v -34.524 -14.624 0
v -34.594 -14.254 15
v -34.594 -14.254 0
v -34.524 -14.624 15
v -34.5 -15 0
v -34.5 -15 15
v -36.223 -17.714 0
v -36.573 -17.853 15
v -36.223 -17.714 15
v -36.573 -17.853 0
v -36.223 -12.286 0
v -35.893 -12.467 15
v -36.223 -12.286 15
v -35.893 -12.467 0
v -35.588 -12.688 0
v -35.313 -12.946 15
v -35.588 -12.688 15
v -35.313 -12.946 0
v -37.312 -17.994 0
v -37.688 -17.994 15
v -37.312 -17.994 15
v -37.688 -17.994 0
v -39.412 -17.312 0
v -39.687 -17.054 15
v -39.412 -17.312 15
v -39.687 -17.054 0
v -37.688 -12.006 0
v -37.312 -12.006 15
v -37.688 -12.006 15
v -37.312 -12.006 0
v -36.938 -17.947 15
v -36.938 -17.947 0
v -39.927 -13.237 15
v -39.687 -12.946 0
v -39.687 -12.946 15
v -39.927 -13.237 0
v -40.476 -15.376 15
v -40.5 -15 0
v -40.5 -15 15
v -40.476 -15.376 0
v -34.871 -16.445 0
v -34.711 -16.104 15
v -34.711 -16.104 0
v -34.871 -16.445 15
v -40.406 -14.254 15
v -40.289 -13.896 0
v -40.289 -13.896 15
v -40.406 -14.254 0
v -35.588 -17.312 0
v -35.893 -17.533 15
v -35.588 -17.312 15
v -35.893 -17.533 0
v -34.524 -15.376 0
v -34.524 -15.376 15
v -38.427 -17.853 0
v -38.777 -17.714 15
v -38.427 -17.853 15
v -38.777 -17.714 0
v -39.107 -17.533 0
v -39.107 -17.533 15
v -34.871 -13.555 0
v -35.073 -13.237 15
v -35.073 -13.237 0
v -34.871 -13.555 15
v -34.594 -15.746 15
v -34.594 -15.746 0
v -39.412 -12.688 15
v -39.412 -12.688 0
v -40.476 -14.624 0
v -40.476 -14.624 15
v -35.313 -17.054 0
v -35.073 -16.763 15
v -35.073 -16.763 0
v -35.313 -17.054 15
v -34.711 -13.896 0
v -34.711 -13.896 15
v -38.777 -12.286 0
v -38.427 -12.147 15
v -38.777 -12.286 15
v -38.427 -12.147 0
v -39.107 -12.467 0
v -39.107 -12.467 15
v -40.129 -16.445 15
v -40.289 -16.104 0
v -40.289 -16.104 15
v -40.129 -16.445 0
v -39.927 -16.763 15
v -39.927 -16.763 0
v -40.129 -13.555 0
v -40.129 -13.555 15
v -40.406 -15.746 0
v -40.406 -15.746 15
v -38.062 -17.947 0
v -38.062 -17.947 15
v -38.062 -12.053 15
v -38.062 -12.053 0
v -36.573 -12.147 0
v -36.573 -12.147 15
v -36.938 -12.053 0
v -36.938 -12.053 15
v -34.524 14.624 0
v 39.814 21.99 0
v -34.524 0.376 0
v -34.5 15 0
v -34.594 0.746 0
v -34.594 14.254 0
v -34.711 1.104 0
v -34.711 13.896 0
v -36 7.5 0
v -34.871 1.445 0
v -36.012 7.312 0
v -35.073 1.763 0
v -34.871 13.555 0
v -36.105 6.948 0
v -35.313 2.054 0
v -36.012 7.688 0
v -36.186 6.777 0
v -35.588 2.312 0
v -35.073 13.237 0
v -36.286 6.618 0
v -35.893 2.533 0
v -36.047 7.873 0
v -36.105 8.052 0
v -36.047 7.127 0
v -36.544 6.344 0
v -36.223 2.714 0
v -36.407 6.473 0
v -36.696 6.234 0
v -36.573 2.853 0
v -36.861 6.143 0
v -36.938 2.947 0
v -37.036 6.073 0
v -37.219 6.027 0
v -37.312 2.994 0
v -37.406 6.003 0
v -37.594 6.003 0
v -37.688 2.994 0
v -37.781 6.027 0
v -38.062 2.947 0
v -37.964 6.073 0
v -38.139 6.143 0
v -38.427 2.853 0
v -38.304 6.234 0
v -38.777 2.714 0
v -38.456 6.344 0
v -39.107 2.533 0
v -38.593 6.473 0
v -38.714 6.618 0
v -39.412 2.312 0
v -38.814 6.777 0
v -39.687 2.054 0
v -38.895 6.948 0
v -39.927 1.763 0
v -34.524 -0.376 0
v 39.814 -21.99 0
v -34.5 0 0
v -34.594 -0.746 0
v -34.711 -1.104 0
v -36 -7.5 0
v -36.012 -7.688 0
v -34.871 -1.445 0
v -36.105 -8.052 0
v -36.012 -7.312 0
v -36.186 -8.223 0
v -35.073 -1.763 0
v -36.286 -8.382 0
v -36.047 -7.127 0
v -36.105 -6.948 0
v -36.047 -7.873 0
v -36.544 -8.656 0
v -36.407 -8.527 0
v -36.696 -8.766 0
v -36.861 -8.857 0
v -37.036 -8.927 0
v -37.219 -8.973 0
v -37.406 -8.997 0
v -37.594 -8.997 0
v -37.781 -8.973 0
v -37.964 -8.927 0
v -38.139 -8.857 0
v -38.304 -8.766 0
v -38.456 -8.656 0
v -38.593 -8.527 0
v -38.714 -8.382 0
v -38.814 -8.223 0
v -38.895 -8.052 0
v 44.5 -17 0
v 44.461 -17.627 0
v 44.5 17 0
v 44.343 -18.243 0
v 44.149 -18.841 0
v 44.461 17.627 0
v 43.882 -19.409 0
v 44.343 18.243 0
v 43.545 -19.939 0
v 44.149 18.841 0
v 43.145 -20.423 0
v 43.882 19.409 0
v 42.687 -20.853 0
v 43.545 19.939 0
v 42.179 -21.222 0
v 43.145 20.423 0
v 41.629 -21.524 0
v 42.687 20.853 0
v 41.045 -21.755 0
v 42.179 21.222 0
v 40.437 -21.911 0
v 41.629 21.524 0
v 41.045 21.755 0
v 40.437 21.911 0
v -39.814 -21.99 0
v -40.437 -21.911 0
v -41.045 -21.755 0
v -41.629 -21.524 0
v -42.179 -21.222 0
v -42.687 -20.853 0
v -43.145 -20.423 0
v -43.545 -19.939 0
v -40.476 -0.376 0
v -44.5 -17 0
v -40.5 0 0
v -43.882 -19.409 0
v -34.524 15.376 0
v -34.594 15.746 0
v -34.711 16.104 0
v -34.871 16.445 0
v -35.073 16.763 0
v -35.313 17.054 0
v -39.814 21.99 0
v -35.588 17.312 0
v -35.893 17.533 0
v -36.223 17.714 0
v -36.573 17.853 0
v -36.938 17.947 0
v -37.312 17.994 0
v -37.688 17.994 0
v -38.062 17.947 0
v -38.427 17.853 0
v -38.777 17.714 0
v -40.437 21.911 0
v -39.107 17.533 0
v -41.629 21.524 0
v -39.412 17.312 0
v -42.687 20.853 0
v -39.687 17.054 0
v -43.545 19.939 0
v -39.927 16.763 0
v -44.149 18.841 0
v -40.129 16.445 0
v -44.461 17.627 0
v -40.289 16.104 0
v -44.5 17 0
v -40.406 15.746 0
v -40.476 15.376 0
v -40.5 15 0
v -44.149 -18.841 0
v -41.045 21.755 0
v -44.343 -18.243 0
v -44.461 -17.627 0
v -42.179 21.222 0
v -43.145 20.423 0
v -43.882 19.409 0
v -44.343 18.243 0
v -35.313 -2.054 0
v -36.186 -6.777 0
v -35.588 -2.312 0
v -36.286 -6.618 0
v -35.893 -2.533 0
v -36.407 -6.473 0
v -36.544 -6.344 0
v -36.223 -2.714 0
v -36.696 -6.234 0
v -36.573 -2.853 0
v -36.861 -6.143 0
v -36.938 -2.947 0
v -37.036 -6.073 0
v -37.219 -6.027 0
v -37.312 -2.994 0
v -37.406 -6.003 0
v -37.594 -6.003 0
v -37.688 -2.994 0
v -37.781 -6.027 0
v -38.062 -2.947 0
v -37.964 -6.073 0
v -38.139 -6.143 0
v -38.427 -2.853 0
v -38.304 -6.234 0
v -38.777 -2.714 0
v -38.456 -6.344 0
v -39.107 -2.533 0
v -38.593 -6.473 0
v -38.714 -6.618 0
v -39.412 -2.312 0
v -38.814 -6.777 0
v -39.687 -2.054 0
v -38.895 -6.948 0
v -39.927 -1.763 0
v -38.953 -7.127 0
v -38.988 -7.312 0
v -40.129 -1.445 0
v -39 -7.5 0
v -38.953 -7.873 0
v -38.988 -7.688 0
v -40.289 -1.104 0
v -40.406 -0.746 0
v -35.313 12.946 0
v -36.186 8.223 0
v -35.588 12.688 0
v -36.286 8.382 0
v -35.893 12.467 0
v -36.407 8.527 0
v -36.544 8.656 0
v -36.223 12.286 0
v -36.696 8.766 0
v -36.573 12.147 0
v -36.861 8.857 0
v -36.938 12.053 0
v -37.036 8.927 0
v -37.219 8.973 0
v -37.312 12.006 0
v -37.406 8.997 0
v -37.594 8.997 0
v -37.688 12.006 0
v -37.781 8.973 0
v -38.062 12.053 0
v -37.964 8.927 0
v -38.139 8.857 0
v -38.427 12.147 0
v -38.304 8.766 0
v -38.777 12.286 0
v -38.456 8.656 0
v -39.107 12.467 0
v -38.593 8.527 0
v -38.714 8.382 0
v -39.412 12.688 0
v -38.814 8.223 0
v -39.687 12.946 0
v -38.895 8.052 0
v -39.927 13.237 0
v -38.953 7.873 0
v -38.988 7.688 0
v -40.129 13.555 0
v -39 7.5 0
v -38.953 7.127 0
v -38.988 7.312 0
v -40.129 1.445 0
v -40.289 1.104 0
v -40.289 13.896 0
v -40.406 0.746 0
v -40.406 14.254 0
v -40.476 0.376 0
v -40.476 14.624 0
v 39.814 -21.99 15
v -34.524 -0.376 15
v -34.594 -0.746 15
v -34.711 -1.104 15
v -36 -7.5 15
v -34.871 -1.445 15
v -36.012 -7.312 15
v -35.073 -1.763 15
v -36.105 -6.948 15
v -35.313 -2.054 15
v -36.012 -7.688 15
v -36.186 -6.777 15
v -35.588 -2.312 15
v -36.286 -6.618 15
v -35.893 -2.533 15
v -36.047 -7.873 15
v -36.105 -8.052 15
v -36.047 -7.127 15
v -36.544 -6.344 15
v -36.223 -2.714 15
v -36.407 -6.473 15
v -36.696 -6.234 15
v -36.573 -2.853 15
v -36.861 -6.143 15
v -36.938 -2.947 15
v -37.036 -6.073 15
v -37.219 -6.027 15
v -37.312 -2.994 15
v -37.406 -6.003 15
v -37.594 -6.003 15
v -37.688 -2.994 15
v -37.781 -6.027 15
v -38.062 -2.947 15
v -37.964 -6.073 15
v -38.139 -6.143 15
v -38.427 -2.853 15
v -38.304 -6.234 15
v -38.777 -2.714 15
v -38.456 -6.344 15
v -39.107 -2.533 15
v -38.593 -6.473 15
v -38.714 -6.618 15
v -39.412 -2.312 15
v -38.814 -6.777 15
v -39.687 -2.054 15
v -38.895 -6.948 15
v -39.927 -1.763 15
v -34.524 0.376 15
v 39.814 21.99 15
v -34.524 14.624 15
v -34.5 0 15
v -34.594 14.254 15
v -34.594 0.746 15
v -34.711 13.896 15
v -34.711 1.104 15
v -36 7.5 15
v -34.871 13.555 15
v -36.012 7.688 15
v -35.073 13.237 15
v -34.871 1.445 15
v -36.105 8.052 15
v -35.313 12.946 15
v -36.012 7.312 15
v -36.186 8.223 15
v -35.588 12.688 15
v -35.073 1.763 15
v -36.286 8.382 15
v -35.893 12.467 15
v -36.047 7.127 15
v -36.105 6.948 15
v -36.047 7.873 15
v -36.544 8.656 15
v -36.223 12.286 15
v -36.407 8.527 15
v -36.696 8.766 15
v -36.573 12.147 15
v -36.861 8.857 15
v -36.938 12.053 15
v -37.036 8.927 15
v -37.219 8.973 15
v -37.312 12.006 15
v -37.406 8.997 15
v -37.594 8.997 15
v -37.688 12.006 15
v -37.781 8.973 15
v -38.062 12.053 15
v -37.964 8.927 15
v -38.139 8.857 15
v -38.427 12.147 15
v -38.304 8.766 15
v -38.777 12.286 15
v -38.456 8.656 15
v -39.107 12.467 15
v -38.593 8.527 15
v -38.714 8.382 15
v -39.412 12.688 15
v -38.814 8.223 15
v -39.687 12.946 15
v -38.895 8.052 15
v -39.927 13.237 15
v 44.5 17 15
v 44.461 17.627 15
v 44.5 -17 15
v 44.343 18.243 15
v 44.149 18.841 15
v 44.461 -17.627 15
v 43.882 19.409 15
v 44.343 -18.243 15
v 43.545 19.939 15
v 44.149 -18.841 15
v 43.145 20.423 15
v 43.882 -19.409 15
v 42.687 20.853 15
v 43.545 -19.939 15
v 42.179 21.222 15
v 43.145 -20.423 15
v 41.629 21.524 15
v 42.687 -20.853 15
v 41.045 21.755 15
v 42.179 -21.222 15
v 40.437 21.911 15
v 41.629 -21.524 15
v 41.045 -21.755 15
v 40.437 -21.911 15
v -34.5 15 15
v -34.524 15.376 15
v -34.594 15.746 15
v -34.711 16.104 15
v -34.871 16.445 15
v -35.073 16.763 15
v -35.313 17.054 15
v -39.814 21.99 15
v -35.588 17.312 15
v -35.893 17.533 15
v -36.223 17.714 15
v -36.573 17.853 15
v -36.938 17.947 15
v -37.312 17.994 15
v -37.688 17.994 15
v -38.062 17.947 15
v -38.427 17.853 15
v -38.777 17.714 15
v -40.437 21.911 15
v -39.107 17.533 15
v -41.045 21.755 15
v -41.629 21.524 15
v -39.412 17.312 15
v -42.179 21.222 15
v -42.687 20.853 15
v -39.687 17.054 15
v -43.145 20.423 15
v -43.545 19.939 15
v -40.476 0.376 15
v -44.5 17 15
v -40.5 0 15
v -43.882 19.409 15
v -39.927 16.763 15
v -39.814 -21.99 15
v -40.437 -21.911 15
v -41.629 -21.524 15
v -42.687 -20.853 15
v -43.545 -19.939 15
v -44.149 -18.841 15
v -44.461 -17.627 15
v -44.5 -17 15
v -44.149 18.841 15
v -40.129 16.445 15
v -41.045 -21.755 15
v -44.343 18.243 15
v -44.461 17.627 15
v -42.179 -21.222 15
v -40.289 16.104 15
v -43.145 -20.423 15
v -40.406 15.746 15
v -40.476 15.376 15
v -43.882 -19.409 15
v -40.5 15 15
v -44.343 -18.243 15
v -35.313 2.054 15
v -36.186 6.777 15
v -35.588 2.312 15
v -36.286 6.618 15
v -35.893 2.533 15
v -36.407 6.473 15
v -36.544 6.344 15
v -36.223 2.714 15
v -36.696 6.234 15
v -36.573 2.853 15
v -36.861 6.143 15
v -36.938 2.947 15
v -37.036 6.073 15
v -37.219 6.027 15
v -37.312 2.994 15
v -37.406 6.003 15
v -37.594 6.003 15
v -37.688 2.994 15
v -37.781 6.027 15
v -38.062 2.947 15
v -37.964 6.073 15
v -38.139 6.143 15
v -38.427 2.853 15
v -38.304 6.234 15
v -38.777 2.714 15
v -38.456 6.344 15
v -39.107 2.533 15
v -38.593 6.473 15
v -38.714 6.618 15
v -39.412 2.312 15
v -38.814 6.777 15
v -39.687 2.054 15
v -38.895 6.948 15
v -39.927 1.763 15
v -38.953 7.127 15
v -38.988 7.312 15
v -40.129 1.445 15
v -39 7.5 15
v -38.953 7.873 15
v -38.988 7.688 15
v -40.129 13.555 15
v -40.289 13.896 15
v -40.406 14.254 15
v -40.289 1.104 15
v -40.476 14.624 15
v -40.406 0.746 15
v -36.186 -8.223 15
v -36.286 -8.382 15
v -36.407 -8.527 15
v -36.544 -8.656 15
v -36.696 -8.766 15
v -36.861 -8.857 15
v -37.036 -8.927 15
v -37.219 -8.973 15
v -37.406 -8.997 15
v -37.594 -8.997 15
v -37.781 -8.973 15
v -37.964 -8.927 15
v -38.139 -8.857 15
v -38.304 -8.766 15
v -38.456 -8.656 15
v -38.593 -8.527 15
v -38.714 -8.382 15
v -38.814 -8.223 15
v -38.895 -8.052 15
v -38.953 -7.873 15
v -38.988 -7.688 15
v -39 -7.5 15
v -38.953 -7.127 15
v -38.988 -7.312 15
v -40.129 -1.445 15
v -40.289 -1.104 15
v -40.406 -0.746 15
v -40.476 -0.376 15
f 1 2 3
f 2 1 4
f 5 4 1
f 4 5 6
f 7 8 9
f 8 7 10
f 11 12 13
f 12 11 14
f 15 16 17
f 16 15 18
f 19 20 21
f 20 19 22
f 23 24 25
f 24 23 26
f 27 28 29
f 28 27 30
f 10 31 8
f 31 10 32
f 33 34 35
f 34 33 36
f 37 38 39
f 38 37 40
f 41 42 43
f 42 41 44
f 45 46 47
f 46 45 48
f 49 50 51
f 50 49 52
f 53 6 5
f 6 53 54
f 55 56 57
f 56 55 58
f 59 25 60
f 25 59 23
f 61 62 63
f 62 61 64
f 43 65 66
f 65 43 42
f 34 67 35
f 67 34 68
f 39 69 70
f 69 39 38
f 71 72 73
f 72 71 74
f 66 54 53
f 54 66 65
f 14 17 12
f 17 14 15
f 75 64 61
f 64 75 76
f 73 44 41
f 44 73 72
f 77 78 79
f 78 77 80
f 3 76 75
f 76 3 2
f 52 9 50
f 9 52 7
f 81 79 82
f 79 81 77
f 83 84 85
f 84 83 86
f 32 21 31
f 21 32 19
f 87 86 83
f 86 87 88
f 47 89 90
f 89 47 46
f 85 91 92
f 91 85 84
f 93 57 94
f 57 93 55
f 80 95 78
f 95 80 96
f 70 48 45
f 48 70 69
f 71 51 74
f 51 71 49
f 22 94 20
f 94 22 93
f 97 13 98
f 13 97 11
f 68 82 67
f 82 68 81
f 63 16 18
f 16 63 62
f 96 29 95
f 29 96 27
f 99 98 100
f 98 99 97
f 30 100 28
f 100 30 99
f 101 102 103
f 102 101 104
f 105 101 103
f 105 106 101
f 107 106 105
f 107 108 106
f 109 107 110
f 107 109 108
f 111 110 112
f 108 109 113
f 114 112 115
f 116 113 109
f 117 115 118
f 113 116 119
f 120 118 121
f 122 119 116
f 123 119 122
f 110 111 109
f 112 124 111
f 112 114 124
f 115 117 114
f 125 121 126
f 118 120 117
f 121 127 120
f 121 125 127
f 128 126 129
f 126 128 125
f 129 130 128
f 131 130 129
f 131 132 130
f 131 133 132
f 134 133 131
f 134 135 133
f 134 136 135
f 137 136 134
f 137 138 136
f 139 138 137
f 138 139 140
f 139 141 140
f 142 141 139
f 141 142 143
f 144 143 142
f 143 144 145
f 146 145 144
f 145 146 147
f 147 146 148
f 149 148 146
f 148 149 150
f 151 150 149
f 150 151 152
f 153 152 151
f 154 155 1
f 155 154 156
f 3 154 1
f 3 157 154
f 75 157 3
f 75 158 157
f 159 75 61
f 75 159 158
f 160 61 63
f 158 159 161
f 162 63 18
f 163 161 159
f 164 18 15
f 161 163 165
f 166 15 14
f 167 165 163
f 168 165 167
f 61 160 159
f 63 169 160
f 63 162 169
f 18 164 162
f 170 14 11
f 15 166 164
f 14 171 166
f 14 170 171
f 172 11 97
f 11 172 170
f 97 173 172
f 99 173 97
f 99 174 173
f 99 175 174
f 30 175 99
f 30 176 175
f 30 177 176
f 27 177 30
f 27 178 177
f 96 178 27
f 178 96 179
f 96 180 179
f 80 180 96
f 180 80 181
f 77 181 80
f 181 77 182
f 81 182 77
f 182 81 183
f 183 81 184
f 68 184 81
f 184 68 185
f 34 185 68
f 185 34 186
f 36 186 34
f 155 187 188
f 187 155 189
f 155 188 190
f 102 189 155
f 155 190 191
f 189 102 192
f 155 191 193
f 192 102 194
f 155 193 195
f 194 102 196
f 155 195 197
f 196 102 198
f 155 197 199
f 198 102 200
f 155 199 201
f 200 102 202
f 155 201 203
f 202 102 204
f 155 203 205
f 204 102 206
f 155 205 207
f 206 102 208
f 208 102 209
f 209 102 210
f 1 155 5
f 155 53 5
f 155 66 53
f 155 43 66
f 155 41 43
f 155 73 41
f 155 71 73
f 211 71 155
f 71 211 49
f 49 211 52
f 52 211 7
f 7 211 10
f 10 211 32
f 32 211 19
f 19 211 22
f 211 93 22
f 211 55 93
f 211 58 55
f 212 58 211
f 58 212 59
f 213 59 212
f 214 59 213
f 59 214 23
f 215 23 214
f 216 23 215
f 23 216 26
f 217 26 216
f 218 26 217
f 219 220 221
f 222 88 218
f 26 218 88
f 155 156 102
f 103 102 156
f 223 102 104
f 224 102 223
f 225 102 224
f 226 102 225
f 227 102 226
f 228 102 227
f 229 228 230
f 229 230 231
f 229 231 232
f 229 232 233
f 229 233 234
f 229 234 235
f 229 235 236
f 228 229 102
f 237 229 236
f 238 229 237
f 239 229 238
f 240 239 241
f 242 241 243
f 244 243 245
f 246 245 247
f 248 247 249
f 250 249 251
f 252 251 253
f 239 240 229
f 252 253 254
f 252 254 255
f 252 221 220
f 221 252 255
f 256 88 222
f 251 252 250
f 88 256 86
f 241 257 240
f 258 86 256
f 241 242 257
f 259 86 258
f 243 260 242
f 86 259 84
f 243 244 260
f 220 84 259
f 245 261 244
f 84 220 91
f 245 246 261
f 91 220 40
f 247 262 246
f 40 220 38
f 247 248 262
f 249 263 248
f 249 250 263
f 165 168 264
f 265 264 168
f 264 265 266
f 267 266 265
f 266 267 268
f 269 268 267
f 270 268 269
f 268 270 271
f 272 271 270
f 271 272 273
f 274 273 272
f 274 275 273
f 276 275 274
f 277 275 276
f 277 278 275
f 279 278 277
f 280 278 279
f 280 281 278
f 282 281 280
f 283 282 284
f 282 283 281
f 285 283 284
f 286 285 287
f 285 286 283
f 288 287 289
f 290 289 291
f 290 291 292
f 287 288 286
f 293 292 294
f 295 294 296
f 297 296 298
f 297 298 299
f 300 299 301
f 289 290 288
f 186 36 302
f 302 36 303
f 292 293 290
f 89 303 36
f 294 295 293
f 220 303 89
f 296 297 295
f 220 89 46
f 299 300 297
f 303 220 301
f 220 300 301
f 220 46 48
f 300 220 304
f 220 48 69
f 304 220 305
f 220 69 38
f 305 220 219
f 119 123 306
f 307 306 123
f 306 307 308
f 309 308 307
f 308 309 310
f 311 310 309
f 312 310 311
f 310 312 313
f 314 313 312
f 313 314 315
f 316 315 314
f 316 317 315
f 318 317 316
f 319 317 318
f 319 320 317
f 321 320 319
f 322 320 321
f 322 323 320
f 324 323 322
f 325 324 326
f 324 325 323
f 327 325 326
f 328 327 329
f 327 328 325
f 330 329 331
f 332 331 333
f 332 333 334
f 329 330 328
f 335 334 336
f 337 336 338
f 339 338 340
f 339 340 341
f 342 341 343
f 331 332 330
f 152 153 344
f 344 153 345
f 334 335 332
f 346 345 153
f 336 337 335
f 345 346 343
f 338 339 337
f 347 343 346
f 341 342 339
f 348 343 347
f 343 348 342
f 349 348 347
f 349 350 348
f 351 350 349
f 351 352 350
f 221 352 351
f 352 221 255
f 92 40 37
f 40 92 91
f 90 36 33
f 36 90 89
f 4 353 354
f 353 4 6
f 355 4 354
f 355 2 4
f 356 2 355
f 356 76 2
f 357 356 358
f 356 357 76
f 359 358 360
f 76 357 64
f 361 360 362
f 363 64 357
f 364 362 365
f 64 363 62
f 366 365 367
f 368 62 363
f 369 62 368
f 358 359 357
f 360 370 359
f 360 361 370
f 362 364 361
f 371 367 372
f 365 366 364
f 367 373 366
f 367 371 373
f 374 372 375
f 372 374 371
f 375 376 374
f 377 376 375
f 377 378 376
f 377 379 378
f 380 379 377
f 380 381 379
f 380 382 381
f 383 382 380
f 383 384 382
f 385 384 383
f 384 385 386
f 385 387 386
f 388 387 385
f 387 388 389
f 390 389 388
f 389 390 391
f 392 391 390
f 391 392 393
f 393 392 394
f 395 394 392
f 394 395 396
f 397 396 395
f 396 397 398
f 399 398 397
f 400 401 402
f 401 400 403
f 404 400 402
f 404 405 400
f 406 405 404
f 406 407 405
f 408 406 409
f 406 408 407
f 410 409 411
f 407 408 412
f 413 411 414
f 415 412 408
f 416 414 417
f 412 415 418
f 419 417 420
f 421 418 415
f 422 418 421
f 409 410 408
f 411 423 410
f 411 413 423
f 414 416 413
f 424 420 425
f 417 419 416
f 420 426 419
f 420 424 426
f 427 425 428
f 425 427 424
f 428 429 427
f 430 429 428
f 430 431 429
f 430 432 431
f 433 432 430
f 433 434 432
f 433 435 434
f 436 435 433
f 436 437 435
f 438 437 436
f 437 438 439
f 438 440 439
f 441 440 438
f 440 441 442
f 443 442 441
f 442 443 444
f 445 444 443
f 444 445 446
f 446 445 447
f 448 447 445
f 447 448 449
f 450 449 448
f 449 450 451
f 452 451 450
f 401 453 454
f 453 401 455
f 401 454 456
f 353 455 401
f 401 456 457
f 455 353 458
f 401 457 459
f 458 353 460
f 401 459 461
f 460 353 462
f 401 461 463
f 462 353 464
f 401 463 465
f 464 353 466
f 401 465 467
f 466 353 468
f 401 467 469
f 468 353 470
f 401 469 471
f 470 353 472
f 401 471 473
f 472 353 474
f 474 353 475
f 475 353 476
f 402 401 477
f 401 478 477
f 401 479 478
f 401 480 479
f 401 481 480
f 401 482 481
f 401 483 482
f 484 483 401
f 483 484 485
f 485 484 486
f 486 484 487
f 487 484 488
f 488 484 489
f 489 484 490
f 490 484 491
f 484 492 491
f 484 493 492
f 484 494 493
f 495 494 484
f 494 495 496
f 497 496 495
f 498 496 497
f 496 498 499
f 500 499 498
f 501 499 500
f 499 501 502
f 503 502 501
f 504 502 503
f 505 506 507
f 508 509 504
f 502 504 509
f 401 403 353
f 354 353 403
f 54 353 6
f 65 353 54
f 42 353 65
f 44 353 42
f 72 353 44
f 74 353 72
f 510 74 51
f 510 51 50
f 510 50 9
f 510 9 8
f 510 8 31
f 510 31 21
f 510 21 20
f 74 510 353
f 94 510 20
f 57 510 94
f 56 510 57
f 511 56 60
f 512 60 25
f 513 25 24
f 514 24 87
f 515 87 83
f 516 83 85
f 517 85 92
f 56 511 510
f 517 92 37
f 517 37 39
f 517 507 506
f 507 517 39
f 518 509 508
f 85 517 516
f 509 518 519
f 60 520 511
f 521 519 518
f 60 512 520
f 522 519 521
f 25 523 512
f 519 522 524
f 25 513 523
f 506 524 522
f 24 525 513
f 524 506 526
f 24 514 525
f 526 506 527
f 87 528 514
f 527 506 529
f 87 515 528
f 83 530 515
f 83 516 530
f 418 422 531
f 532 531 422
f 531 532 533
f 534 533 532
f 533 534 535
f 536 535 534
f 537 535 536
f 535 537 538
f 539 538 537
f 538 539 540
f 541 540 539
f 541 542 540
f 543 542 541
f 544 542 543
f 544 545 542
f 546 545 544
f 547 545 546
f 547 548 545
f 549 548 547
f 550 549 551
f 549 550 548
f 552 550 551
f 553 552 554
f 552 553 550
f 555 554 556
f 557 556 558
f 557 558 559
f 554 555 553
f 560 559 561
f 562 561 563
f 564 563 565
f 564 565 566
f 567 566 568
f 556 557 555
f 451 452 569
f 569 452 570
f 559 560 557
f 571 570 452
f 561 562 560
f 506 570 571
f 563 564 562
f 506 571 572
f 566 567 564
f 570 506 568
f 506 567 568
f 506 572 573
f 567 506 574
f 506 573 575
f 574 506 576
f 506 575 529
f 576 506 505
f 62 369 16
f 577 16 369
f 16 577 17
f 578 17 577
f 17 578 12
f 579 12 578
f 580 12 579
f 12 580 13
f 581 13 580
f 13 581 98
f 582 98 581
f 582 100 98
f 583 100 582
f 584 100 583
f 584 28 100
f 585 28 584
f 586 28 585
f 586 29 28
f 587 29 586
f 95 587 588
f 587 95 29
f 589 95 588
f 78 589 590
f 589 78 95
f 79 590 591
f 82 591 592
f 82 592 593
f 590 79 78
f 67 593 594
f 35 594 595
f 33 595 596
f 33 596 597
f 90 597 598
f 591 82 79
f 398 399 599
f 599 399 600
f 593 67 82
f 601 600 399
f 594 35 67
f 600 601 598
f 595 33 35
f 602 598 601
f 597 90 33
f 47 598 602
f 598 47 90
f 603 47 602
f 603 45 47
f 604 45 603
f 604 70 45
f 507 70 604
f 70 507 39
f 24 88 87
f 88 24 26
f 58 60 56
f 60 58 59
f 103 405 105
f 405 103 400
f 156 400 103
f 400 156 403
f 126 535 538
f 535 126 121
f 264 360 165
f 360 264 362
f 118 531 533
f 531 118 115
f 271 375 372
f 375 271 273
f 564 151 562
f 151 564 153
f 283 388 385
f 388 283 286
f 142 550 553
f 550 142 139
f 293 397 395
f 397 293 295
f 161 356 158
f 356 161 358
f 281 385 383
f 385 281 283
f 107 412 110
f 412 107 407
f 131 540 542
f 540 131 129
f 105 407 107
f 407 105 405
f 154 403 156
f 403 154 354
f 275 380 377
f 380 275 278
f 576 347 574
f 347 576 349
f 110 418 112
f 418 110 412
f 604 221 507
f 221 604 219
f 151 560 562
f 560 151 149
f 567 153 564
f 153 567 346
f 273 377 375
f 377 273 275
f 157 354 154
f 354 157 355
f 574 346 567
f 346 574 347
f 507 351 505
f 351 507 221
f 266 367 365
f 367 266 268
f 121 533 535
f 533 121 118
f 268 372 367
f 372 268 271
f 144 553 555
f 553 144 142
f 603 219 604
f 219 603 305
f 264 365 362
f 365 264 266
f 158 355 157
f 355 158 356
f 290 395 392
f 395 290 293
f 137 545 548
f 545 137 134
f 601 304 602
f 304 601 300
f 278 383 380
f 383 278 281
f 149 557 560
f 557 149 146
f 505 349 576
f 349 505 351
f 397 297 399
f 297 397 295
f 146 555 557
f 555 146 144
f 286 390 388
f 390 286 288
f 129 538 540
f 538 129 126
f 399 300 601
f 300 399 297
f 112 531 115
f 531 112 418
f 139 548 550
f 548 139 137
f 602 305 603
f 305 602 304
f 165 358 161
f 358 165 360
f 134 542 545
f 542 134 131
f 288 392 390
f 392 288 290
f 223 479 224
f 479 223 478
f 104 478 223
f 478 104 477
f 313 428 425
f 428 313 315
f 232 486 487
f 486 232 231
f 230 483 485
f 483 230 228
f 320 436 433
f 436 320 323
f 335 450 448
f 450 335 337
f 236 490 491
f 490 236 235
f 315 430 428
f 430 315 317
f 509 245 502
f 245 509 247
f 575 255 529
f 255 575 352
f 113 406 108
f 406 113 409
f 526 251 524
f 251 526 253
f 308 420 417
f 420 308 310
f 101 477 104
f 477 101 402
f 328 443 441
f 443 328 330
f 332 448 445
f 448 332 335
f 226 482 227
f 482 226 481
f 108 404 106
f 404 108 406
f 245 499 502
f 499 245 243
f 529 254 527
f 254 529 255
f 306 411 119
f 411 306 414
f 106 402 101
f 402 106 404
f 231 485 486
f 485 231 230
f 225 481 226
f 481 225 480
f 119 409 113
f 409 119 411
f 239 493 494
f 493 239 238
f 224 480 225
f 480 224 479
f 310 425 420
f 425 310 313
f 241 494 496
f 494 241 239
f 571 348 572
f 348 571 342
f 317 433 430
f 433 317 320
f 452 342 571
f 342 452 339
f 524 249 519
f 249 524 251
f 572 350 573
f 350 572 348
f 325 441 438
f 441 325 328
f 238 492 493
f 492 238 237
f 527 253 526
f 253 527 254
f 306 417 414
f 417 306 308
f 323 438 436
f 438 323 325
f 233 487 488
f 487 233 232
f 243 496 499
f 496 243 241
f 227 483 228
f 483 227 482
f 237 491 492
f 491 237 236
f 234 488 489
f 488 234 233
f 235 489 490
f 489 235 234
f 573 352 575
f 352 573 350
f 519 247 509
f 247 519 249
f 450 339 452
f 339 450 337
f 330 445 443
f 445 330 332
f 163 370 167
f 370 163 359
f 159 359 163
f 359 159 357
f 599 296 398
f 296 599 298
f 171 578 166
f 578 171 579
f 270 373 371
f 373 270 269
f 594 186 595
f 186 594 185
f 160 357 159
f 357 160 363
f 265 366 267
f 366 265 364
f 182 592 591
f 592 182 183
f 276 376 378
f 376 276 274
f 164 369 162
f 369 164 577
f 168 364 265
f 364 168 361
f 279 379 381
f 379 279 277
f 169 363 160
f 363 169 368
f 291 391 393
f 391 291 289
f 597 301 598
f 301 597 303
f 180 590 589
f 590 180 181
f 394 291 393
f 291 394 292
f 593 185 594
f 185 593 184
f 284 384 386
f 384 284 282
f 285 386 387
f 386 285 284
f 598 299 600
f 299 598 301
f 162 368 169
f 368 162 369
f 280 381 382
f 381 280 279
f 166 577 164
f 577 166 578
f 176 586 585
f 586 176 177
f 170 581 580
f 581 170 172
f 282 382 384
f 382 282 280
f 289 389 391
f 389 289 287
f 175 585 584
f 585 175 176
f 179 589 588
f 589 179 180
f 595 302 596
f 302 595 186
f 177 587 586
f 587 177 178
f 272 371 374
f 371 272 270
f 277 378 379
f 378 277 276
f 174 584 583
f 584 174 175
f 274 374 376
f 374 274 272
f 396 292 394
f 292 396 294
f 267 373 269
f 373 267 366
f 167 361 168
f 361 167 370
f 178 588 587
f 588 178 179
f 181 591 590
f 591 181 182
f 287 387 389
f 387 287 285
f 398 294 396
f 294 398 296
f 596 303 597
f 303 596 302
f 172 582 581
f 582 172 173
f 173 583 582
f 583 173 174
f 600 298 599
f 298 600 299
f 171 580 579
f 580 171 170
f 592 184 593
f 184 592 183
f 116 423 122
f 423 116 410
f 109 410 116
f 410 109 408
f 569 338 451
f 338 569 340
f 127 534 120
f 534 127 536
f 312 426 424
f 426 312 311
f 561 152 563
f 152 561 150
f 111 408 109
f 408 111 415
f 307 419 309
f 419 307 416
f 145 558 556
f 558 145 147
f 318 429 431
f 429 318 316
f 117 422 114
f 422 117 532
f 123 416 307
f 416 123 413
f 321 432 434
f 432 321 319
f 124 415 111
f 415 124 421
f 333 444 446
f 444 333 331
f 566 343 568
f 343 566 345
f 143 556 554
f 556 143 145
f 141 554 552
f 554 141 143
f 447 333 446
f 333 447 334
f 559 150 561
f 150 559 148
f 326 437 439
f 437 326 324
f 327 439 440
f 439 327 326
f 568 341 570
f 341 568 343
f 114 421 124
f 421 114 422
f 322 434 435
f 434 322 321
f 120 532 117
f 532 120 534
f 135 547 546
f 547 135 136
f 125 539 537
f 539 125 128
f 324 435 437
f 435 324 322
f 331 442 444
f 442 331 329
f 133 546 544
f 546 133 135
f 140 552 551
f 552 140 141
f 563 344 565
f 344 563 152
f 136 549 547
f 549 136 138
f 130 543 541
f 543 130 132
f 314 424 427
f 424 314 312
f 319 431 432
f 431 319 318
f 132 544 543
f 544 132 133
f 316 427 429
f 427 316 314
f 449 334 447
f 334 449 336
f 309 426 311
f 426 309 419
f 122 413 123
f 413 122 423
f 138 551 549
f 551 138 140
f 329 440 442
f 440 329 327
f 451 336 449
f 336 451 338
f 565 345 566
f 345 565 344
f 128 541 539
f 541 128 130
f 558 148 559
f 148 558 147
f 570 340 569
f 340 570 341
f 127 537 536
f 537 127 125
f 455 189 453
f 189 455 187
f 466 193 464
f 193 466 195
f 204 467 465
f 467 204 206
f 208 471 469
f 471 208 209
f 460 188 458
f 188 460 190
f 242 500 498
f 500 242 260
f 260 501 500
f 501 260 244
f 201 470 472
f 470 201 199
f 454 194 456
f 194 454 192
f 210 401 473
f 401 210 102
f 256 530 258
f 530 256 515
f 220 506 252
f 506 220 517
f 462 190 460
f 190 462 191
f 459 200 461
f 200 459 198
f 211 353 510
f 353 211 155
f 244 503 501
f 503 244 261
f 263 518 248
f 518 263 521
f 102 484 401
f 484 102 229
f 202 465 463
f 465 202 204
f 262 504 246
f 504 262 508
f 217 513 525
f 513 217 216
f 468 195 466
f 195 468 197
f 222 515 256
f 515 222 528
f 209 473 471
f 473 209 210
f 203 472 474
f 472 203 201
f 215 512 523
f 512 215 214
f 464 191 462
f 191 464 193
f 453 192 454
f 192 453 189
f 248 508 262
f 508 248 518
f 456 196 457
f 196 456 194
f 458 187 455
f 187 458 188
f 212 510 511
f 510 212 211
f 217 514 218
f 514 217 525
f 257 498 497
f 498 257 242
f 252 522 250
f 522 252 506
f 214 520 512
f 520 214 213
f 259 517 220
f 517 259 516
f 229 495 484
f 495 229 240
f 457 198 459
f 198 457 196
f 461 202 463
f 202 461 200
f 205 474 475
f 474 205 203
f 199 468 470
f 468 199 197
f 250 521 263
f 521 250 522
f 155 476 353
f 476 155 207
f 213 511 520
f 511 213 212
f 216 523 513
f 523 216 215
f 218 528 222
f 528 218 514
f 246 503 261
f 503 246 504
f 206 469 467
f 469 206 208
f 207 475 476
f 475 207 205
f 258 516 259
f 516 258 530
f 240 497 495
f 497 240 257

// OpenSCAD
$fn = 50;


difference() {
	union() {
		hull() {
			translate(v = [-39.5000000000, 17.0000000000, 0]) {
				cylinder(h = 15, r = 5);
			}
			translate(v = [39.5000000000, 17.0000000000, 0]) {
				cylinder(h = 15, r = 5);
			}
			translate(v = [-39.5000000000, -17.0000000000, 0]) {
				cylinder(h = 15, r = 5);
			}
			translate(v = [39.5000000000, -17.0000000000, 0]) {
				cylinder(h = 15, r = 5);
			}
		}
	}
	union() {
		translate(v = [-37.5000000000, -15.0000000000, 0]) {
			cylinder(h = 15, r = 3.0000000000);
		}
		translate(v = [-37.5000000000, 0.0000000000, 0]) {
			cylinder(h = 15, r = 3.0000000000);
		}
		translate(v = [-37.5000000000, 15.0000000000, 0]) {
			cylinder(h = 15, r = 3.0000000000);
		}
		translate(v = [-37.5000000000, -15.0000000000, 0]) {
			cylinder(h = 15, r = 1.5000000000);
		}
		translate(v = [-37.5000000000, -7.5000000000, 0]) {
			cylinder(h = 15, r = 1.5000000000);
		}
		translate(v = [-37.5000000000, 0.0000000000, 0]) {
			cylinder(h = 15, r = 1.5000000000);
		}
		translate(v = [-37.5000000000, 7.5000000000, 0]) {
			cylinder(h = 15, r = 1.5000000000);
		}
		translate(v = [-37.5000000000, 15.0000000000, 0]) {
			cylinder(h = 15, r = 1.5000000000);
		}
		translate(v = [-37.5000000000, -15.0000000000, 0]) {
			cylinder(h = 15, r = 1.5000000000);
		}
		translate(v = [-37.5000000000, -7.5000000000, 0]) {
			cylinder(h = 15, r = 1.5000000000);
		}
		translate(v = [-37.5000000000, 0.0000000000, 0]) {
			cylinder(h = 15, r = 1.5000000000);
		}
		translate(v = [-37.5000000000, 7.5000000000, 0]) {
			cylinder(h = 15, r = 1.5000000000);
		}
		translate(v = [-37.5000000000, 15.0000000000, 0]) {
			cylinder(h = 15, r = 1.5000000000);
		}
		translate(v = [-37.5000000000, -15.0000000000, 0]) {
			cylinder(h = 15, r = 1.5000000000);
		}
		translate(v = [-37.5000000000, -7.5000000000, 0]) {
			cylinder(h = 15, r = 1.5000000000);
		}
		translate(v = [-37.5000000000, 0.0000000000, 0]) {
			cylinder(h = 15, r = 1.5000000000);
		}
		translate(v = [-37.5000000000, 7.5000000000, 0]) {
			cylinder(h = 15, r = 1.5000000000);
		}
		translate(v = [-37.5000000000, 15.0000000000, 0]) {
			cylinder(h = 15, r = 1.5000000000);
		}
	}
}
